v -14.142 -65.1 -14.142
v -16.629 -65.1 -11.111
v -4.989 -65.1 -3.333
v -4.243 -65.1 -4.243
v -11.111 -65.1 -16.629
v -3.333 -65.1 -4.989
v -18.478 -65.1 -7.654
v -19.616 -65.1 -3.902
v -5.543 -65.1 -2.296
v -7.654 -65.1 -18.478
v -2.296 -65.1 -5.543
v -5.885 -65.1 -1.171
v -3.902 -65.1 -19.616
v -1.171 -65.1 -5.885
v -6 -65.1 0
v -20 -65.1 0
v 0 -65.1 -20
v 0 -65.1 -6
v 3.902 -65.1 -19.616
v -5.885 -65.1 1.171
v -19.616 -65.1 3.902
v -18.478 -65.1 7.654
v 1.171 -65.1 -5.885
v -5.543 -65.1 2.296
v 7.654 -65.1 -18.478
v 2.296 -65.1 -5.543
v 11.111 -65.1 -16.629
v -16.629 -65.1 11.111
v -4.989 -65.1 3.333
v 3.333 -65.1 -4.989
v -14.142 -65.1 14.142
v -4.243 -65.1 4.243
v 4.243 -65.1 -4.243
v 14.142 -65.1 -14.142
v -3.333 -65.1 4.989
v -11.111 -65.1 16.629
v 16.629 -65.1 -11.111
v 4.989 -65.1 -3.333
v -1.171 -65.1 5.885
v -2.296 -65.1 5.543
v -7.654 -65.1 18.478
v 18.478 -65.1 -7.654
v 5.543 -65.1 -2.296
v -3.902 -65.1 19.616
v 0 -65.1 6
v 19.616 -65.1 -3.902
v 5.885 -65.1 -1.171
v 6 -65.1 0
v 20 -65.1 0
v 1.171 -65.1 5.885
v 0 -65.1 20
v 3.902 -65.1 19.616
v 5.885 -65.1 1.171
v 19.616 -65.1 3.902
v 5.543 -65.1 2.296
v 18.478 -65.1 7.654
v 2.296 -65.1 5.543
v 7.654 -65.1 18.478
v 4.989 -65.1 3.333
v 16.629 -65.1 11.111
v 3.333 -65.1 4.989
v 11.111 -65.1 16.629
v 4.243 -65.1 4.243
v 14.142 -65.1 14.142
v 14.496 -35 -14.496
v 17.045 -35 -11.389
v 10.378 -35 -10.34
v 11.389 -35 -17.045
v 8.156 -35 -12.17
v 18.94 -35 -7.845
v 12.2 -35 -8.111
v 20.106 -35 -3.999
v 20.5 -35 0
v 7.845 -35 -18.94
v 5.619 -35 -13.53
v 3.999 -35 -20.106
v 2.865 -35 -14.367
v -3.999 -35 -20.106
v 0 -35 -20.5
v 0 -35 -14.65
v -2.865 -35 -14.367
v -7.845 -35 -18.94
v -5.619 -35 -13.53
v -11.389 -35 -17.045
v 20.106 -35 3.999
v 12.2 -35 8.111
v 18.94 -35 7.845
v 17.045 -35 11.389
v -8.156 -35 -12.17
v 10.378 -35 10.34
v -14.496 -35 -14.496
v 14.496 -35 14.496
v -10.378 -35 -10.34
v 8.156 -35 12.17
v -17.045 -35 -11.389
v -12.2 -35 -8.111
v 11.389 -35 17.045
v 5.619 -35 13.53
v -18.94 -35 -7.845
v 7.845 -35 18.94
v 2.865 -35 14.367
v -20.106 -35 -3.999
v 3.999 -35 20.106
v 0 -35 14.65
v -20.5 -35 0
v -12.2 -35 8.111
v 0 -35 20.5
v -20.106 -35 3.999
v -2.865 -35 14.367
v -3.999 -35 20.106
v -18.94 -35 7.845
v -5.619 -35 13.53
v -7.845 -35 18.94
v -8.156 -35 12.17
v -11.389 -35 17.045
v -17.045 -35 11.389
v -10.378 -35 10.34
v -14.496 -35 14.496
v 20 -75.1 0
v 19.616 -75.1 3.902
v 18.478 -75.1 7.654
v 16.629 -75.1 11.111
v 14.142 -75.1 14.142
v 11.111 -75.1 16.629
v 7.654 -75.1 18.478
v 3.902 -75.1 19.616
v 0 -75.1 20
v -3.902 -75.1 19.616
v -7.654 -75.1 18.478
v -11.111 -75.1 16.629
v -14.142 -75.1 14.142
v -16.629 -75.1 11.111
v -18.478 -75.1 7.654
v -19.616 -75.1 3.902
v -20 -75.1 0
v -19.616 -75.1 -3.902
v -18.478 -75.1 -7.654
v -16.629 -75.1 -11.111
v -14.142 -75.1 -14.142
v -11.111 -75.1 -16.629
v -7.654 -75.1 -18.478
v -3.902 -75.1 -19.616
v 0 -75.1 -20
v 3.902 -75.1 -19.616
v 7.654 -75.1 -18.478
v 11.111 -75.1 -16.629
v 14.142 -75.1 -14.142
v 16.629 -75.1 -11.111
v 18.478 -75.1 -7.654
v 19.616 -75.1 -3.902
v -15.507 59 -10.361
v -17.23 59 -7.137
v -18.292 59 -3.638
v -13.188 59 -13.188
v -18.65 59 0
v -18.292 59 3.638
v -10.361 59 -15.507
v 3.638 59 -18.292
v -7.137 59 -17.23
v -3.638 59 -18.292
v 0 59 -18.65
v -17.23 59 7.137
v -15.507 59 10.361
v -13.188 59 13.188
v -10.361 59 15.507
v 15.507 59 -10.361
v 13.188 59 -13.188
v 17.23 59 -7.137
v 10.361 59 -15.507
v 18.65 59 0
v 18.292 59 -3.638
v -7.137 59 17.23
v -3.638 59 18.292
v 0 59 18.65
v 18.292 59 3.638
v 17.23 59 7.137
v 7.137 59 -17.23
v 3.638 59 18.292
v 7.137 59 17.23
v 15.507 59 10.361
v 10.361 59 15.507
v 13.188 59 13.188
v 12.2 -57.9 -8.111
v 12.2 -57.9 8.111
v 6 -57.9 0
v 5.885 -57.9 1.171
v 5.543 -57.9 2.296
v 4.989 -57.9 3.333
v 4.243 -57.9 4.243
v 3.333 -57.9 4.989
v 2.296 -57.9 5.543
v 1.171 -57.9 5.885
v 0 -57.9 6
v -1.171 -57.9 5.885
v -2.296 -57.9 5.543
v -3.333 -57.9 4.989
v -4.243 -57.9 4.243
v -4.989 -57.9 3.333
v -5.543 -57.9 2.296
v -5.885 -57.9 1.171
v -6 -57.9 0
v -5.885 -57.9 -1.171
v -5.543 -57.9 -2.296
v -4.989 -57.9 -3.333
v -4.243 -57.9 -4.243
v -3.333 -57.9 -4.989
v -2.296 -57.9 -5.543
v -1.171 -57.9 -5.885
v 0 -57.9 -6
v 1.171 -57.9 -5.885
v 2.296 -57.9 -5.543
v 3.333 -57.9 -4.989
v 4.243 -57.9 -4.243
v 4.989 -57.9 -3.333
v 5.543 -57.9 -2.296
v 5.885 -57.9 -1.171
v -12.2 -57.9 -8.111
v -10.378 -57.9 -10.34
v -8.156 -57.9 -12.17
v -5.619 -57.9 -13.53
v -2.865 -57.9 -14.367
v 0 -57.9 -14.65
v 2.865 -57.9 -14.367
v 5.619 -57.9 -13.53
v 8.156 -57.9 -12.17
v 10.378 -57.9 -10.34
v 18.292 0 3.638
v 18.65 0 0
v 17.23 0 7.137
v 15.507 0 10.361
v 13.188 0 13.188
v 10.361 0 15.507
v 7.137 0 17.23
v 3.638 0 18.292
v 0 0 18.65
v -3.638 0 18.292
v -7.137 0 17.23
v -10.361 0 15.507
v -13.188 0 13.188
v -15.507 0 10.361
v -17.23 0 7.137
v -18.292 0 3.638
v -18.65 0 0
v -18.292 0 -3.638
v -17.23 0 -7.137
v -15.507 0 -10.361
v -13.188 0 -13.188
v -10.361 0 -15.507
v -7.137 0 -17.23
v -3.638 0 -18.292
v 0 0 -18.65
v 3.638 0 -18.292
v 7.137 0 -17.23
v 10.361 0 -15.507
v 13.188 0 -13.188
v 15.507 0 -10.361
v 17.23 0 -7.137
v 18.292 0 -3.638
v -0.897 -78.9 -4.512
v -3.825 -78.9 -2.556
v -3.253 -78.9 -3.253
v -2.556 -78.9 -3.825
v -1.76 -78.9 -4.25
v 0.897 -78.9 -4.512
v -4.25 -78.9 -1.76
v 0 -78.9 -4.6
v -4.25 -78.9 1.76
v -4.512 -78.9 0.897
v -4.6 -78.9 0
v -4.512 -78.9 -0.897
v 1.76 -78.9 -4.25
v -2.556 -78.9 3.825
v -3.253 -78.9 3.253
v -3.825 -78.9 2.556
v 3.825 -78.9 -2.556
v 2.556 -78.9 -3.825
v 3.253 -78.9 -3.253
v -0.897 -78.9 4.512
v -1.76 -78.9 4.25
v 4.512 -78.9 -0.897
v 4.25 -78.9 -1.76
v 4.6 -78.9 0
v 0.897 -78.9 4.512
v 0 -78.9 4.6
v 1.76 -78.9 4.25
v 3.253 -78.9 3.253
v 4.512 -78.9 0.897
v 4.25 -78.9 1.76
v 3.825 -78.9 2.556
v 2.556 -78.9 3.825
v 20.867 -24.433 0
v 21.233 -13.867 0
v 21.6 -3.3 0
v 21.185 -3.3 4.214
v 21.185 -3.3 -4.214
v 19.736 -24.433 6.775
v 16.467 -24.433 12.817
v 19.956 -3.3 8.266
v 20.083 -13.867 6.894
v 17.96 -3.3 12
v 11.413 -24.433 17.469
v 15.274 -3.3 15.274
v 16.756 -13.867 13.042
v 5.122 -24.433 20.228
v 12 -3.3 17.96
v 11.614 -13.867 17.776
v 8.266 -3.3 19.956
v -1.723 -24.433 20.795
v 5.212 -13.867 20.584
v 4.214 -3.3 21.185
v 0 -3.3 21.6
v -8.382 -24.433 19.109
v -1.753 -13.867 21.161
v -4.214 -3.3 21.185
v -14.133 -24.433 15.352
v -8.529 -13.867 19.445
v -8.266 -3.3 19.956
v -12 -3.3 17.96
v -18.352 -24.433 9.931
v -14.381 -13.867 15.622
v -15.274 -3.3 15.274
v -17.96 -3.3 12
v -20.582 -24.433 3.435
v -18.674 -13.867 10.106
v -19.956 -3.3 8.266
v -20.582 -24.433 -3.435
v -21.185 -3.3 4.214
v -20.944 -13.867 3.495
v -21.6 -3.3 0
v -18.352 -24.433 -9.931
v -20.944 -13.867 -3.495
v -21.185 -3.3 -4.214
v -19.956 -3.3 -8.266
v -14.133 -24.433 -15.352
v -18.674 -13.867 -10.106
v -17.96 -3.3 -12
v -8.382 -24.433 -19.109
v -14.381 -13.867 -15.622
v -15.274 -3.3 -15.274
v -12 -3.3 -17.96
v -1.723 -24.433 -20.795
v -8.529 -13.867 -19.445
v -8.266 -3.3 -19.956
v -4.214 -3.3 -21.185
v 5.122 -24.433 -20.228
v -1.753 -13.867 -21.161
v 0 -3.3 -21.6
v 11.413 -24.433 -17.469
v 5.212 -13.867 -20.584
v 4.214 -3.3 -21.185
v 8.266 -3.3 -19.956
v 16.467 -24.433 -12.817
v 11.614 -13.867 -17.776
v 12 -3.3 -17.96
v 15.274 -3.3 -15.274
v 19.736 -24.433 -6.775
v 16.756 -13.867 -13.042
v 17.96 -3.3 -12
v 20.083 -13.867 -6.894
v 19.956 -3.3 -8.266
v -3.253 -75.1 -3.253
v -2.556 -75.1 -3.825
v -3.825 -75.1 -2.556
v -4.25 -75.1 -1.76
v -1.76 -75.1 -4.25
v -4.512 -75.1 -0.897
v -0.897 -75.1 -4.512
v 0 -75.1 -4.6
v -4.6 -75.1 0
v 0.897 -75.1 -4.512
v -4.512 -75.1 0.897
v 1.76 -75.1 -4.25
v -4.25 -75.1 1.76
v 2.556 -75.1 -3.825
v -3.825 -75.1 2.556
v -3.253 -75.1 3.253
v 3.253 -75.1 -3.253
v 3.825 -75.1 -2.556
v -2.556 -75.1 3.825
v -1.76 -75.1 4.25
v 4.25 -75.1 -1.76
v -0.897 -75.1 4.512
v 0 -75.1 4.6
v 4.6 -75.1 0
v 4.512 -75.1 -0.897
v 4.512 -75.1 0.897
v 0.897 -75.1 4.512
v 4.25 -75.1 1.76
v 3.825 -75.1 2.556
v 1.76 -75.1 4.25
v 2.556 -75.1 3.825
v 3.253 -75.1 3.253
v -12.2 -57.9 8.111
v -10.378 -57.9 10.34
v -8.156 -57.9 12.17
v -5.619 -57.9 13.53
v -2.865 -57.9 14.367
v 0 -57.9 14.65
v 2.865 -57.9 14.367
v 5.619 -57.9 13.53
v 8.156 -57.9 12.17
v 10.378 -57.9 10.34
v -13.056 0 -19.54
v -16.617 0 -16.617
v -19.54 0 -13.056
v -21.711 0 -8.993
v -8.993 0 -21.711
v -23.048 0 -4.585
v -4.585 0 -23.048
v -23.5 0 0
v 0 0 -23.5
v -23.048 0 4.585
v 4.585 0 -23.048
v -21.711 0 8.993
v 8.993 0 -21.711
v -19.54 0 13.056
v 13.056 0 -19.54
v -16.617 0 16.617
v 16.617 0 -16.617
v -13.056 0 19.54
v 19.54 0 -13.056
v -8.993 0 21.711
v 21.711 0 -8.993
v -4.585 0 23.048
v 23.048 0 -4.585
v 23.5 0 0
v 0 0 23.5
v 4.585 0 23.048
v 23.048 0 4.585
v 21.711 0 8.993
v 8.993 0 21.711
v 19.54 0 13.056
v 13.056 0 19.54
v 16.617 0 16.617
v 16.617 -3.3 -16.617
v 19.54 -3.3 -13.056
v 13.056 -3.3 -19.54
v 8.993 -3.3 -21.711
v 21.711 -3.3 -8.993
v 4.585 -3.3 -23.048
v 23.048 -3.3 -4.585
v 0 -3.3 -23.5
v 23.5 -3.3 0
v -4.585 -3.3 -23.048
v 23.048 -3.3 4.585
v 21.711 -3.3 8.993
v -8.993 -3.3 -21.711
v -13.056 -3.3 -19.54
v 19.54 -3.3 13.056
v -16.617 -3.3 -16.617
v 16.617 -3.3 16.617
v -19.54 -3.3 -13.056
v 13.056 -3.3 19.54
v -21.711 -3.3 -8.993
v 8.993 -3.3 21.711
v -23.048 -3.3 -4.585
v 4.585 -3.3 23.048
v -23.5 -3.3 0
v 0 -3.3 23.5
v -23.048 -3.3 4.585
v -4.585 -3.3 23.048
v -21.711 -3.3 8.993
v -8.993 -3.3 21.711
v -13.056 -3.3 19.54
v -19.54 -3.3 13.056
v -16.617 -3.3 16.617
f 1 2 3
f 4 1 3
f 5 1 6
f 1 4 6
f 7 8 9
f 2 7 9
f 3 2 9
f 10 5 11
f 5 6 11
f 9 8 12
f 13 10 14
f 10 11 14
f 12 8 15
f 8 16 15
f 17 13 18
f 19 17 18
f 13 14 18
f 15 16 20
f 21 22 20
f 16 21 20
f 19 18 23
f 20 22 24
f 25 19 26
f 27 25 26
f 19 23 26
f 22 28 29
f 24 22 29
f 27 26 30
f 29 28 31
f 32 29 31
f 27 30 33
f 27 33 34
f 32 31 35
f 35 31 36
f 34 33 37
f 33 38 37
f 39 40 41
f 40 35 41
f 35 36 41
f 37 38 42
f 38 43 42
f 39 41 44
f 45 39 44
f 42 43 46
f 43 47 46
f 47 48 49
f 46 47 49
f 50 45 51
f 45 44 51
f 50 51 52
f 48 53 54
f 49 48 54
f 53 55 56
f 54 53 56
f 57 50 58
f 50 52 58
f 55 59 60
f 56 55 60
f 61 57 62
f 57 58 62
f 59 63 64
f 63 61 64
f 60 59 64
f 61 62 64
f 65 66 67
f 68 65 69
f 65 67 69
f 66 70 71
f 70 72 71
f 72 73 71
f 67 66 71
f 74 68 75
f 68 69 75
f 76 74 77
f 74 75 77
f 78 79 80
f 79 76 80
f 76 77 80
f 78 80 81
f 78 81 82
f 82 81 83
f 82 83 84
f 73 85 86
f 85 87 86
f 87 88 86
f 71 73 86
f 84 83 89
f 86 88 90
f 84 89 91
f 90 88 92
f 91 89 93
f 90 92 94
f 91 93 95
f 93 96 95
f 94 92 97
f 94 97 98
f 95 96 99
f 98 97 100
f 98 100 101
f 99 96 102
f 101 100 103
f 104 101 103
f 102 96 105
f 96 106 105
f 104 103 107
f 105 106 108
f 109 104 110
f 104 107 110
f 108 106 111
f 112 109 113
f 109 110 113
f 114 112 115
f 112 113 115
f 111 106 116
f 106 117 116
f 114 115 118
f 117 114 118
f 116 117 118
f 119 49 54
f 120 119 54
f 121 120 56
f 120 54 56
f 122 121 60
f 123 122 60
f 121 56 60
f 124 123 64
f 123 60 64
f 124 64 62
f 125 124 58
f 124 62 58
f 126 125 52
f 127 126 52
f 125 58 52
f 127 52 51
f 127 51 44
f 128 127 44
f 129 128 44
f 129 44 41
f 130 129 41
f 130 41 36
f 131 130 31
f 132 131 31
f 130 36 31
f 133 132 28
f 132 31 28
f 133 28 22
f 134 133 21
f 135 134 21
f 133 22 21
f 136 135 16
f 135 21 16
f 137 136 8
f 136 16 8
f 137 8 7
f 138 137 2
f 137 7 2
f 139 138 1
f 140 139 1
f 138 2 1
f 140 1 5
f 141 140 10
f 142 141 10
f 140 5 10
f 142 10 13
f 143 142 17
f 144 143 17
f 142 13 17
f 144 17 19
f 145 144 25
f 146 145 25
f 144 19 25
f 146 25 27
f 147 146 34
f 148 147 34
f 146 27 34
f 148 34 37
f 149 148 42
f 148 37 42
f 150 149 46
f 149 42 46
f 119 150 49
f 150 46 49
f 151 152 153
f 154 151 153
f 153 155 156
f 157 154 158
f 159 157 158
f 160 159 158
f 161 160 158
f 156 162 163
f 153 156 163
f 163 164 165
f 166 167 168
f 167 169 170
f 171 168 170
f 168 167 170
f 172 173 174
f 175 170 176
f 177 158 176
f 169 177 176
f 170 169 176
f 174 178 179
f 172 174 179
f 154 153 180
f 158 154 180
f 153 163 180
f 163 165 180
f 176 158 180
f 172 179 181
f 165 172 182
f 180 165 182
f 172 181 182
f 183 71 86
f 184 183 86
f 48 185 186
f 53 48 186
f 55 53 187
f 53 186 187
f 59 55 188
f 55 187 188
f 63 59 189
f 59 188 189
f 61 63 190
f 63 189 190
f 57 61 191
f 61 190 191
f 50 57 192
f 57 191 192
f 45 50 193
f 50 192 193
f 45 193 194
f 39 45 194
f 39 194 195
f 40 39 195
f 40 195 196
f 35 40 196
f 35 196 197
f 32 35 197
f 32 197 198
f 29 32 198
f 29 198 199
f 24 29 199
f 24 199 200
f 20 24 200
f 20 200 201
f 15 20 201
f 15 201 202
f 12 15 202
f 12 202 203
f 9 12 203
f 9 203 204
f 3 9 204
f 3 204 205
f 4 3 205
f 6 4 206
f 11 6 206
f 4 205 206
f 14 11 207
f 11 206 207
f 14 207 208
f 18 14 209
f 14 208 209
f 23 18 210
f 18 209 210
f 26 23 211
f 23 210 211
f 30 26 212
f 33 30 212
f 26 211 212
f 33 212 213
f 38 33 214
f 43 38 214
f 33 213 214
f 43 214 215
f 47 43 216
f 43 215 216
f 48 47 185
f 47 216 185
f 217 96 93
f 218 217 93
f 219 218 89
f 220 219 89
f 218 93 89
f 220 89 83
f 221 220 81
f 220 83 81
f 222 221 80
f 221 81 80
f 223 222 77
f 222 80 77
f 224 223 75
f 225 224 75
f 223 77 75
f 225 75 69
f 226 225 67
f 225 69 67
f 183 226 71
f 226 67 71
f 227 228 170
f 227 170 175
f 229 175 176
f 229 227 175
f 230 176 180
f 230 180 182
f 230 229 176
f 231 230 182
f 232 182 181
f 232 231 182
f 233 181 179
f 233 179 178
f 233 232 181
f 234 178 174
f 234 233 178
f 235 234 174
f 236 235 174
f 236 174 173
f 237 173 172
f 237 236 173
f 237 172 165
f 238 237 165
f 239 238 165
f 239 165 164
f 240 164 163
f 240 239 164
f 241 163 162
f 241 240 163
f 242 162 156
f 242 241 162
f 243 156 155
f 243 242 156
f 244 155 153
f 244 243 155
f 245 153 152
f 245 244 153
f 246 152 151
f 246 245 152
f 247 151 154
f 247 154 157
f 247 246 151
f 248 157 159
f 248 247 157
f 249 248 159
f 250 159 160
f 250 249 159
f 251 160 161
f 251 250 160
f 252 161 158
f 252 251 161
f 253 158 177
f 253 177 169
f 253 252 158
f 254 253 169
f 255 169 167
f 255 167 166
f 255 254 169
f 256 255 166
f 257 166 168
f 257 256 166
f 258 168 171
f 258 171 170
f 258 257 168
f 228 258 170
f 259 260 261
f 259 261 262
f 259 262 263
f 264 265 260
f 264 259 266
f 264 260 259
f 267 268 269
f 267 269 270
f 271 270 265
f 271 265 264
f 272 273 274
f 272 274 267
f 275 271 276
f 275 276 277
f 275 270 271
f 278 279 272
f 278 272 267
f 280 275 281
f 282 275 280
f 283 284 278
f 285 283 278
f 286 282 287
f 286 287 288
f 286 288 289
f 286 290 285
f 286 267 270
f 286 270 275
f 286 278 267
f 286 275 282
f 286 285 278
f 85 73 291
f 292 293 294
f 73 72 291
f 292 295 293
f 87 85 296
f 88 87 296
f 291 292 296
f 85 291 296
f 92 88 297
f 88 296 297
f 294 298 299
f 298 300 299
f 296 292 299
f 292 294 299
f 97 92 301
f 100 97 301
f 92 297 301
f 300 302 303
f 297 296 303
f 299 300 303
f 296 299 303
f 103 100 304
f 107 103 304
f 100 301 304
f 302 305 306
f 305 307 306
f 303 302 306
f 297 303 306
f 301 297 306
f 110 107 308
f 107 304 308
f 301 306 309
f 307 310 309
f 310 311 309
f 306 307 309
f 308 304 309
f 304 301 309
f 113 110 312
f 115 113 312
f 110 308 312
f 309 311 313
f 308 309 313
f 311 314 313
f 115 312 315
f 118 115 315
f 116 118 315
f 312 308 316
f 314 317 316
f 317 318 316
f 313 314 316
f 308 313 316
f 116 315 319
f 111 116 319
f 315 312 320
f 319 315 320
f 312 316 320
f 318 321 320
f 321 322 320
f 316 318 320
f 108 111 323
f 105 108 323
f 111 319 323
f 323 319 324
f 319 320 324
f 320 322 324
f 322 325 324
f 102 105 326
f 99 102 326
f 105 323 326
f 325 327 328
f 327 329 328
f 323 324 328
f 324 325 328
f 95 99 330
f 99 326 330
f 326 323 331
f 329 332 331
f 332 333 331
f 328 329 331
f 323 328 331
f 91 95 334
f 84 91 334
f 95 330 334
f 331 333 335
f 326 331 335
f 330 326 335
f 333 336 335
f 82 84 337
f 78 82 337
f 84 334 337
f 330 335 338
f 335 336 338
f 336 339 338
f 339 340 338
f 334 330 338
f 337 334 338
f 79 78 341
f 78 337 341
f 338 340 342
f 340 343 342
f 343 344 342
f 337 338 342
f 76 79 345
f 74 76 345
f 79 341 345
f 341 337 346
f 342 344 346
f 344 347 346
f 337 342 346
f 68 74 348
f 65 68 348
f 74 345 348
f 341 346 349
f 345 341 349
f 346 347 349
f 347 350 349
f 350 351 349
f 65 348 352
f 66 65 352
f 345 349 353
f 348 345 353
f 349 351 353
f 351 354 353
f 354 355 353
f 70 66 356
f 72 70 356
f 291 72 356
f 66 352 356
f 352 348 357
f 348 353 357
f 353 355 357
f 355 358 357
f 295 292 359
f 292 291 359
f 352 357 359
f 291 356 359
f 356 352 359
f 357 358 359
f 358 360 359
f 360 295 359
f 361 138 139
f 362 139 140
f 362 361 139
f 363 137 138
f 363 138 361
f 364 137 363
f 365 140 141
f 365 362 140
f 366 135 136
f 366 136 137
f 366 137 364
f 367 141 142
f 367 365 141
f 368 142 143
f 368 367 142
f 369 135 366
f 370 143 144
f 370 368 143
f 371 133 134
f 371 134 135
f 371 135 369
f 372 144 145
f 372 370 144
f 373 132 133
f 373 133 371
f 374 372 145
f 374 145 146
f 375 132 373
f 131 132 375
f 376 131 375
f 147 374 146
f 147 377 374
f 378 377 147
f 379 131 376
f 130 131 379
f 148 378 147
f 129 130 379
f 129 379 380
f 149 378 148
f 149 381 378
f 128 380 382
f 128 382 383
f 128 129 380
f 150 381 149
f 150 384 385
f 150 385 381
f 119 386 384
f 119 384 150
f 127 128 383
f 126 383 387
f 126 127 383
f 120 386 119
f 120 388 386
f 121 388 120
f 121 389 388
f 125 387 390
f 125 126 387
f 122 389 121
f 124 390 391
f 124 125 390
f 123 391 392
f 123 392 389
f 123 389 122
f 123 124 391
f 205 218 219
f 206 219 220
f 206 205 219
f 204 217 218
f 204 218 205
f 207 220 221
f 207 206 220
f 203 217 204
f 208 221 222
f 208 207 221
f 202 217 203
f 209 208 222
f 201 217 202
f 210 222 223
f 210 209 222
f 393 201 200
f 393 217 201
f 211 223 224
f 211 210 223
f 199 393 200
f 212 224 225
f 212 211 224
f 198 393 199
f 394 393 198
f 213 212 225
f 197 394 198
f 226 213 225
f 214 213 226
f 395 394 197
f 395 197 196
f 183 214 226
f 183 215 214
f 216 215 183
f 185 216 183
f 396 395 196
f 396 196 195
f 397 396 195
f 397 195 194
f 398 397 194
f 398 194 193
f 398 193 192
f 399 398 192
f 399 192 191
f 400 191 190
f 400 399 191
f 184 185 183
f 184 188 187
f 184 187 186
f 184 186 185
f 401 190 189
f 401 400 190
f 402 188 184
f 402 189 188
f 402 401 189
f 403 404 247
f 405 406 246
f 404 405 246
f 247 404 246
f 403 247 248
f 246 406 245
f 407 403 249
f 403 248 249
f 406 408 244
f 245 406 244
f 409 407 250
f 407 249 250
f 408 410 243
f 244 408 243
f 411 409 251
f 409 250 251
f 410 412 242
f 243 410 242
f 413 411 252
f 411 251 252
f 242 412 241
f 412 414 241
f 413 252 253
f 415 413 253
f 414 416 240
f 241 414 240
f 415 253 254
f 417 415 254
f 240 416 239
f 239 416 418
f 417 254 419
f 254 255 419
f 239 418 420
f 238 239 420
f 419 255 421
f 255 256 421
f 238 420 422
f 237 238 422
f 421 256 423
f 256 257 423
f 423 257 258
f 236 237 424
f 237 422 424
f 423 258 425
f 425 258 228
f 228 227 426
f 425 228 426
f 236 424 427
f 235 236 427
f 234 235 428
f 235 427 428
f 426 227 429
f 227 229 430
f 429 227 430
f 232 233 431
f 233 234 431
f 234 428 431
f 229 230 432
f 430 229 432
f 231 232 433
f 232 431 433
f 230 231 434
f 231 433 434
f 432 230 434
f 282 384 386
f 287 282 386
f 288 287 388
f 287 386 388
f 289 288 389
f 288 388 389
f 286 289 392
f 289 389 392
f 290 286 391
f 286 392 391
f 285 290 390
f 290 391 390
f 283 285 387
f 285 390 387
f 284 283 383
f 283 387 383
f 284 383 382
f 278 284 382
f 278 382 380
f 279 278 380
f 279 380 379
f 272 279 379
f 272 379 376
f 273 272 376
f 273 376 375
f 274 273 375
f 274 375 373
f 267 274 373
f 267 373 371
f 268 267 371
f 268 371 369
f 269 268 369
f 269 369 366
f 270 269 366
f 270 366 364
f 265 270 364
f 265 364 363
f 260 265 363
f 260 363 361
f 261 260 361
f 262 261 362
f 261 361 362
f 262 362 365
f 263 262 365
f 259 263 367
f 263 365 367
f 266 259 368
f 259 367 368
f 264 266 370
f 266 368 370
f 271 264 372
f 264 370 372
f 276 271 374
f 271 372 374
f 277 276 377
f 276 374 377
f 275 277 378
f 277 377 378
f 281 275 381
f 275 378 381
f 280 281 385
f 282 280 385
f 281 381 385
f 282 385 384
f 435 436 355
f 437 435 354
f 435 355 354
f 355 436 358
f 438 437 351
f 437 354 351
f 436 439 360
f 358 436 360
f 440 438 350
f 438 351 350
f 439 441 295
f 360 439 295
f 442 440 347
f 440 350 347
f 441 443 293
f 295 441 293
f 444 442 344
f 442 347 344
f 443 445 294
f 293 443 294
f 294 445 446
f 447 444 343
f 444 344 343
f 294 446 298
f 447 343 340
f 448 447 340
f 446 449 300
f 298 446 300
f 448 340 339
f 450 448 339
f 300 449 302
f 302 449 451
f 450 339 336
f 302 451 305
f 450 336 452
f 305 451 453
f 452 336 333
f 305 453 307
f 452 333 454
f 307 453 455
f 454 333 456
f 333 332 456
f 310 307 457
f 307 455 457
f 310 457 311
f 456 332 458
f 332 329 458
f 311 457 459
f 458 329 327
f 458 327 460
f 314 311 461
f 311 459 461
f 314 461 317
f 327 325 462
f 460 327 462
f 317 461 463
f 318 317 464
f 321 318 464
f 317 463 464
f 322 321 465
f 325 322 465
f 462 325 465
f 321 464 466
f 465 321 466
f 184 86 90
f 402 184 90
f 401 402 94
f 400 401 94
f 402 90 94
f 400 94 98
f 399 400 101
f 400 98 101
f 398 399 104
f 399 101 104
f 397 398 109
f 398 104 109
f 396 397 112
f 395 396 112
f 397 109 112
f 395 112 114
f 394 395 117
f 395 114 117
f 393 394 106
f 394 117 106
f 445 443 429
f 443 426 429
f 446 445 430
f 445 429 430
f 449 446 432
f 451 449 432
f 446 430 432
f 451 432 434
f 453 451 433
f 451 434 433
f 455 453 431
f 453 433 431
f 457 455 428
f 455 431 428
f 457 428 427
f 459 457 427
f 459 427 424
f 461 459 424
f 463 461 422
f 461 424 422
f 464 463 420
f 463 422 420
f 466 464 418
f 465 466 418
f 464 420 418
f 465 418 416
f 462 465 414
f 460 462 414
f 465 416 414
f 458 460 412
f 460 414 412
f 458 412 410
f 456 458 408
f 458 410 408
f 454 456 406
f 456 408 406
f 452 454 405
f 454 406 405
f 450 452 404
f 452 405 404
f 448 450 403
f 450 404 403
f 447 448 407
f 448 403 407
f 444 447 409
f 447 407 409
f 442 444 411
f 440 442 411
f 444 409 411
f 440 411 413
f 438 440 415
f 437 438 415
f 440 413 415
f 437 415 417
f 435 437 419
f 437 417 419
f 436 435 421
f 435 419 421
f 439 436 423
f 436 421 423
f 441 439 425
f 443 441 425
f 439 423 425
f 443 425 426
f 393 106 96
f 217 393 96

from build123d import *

# Parameters (mm, degrees)
F0_R     = 18.65
F1_DEPTH = 59
F4_R     = 6
F4_R_2   = 4.6
F5_DEPTH = 22.9
F6_DEPTH = 30.1
F7_DEPTH = 43.9
F8_R     = 20
F8_R_2   = 6
F9_DEPTH = 10


with BuildPart() as f1:
    # F0 (on Front) → F1 (new body)
    with BuildSketch(Plane.XZ):
        Circle(F0_R)
    extrude(amount=-F1_DEPTH)

    # F2 (on Top) → F3 (revolve)
    with BuildSketch(Plane.XY):
        Polygon((23.5, 0), (0, 0), (0, -35), (20.5, -35), (21.6, -3.3), (23.5, -3.3), align=None)
    revolve(axis=Axis((0, -17.5, 0), (0, -1, 0)))

    # F4 (on face) → F5 (join)
    with BuildSketch(Plane.XZ.offset(35)):
        with BuildLine():
            ThreePointArc((12.2, 8.110641), (0, 14.65), (-12.2, 8.110641))
            Line((-12.2, 8.110641), (-12.2, -8.110641))
            ThreePointArc((-12.2, -8.110641), (0, -14.65), (12.2, -8.110641))
            Line((12.2, -8.110641), (12.2, 8.110641))
        make_face()
        Circle(F4_R, mode=Mode.SUBTRACT)
        Circle(F4_R)
        Circle(F4_R_2, mode=Mode.SUBTRACT)
        Circle(F4_R_2)
    extrude(amount=F5_DEPTH)

    # F4 (on face) → F6 (join)
    with BuildSketch(Plane.XZ.offset(35)):
        Circle(F4_R)
        Circle(F4_R_2, mode=Mode.SUBTRACT)
        Circle(F4_R_2)
    extrude(amount=F6_DEPTH)

    # F4 (on face) → F7 (join)
    with BuildSketch(Plane.XZ.offset(35)):
        Circle(F4_R_2)
    extrude(amount=F7_DEPTH)

    # F8 (on face) → F9 (join)
    with BuildSketch(Plane.XZ.offset(65.1)):
        Circle(F8_R)
        Circle(F8_R_2)
    extrude(amount=F9_DEPTH)


solid = f1.part
